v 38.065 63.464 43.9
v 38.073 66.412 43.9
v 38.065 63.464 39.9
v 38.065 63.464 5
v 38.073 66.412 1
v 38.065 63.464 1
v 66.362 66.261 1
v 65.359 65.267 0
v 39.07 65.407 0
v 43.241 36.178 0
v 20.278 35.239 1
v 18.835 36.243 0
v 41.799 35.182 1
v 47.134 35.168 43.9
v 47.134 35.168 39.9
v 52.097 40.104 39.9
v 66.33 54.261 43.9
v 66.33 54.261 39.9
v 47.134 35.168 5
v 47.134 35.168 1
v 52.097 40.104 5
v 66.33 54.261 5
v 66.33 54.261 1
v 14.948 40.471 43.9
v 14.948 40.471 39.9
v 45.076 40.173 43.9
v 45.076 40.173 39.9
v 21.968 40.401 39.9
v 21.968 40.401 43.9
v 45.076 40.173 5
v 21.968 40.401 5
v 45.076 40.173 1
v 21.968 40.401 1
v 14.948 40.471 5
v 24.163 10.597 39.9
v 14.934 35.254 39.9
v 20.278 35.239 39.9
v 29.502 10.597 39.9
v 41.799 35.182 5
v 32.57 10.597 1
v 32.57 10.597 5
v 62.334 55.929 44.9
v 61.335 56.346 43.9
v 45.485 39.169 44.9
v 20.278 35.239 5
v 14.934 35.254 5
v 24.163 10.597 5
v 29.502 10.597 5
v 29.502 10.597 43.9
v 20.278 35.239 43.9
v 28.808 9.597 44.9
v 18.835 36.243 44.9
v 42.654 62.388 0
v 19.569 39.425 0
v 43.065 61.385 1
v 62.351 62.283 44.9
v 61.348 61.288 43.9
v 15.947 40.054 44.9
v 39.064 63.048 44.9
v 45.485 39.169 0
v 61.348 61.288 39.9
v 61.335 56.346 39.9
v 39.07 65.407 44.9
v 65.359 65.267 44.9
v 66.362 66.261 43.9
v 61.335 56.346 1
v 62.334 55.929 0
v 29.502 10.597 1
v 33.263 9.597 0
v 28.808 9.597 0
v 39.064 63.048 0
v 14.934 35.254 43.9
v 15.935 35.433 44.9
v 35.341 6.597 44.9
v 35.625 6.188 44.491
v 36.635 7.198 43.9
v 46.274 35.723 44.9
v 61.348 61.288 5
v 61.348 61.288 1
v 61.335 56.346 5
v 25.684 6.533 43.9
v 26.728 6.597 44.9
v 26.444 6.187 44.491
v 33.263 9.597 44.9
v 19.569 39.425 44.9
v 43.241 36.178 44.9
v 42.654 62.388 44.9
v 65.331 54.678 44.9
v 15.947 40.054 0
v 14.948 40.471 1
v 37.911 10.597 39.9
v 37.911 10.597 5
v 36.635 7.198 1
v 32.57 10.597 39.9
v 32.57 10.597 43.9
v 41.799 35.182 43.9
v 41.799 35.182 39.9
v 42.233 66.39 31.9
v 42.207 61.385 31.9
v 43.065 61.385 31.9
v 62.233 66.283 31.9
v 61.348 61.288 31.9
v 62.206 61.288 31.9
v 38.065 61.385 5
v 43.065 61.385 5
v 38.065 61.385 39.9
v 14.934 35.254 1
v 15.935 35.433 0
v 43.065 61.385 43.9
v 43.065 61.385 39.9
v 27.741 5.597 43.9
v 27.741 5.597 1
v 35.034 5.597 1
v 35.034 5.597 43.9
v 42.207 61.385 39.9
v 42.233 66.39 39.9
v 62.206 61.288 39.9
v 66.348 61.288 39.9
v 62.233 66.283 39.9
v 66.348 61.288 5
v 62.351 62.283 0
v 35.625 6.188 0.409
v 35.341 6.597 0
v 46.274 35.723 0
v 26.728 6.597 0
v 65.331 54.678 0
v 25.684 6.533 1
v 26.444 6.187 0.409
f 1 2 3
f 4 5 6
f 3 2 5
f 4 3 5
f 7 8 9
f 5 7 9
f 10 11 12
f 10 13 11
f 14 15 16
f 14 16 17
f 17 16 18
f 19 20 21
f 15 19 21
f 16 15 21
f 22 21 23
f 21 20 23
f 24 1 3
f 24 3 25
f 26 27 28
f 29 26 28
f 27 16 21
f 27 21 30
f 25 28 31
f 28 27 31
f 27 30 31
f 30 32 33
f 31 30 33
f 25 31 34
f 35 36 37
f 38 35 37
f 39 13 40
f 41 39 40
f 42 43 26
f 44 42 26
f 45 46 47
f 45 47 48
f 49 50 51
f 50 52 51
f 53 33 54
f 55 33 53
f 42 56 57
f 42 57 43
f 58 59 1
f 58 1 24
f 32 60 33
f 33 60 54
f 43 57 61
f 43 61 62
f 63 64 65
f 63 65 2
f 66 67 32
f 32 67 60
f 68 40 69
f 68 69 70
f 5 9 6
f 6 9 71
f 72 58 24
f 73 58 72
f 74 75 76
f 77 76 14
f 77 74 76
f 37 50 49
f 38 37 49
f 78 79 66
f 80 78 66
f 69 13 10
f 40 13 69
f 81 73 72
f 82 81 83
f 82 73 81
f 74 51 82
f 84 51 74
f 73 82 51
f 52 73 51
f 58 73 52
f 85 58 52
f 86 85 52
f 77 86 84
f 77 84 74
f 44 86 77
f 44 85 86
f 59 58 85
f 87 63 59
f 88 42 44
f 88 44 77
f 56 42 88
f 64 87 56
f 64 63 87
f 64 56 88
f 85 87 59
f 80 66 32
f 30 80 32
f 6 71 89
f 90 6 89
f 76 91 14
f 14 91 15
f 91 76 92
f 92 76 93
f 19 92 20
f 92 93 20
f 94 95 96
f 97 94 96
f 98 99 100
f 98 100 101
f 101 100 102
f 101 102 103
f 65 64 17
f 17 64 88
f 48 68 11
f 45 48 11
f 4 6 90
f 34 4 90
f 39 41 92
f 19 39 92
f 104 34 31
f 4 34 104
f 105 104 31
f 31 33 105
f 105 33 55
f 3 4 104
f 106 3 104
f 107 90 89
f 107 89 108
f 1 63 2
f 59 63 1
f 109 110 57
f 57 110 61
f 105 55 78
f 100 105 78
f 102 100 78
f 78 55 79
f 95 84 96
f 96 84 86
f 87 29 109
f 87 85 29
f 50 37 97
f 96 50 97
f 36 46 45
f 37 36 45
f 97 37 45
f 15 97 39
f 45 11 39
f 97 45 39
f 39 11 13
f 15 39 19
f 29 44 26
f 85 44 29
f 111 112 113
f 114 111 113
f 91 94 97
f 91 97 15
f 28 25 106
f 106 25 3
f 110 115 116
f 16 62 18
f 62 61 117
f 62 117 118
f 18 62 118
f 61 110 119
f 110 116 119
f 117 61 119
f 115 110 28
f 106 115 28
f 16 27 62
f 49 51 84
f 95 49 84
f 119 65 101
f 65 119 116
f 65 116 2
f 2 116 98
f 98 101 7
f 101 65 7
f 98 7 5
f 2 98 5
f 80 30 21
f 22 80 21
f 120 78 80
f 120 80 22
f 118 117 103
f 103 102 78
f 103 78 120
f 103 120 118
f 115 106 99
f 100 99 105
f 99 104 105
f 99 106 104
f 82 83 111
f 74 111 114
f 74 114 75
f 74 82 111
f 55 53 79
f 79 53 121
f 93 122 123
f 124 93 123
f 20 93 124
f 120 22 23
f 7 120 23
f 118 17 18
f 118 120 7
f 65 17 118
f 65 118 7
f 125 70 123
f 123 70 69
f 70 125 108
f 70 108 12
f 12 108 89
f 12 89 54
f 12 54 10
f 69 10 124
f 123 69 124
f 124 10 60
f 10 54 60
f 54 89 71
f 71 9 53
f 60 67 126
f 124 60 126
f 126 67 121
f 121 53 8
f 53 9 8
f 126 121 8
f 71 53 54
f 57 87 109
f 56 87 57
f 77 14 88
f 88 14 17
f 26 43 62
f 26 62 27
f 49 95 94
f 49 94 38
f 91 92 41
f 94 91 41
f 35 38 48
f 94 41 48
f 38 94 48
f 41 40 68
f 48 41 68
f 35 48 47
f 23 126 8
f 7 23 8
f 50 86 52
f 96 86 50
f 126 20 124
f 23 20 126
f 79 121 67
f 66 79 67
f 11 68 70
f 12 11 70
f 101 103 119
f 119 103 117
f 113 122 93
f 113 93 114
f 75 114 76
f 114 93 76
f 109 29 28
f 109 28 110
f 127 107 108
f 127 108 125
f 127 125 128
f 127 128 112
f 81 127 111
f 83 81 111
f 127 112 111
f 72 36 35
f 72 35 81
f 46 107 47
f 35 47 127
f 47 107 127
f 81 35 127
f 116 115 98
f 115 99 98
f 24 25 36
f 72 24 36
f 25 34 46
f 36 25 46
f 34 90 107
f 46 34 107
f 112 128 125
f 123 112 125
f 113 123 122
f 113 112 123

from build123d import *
from OCP.BRepFilletAPI import BRepFilletAPI_MakeChamfer

# Parameters (mm, degrees)
BOSS_EXTRUDE1_DEPTH  = 5
BOSS_EXTRUDE3_DEPTH  = 5
BOSS_EXTRUDE4_DEPTH  = 26.9
SKETCH5_W            = 19.999999999999993
SKETCH5_H            = 5.000000000000007
CUT_EXTRUDE2_DEPTH   = 5.899999999999998
CUT_EXTRUDE3_DEPTH   = 2.949999999999999
BOSS_EXTRUDE5_DEPTH  = 3
BOSS_EXTRUDE6_DEPTH  = 5
BOSS_EXTRUDE7_DEPTH  = 5
BOSS_EXTRUDE8_DEPTH  = 35.00000000000001
BOSS_EXTRUDE10_DEPTH = 35.00000000000001
CHAMFER2_SIZE        = 1
CHAMFER3_SIZE        = 1
CHAMFER3_SIZE2       = 1.7100094702429673
CHAMFER3_SIZE2_2     = 1.7064334239442103


with BuildPart() as part:
    # Model → Boss-Extrude1 (new body)
    with BuildSketch(Plane.XY):
        Polygon((66.34301586992632, 59.26133691593834), (66.3616632211768, 66.2613120784865), (38.072757817888686, 66.41203172728402), (38.064905748927345, 63.464466308167324), (14.948145869822214, 40.47054145556226), (14.934248363068548, 35.253596657867014), (26.03420495541168, 5.596834863804027), (36.03420495541168, 5.596834863804027), (47.134161547754815, 35.167818769025025), (66.32969633331885, 54.261354656975335), align=None)
        Polygon((20.278317449078216, 35.23936050258937), (41.79885052391343, 35.18203159355395), (32.57039139015228, 10.596834863804013), (29.501541711242254, 10.596834863804041), align=None, mode=Mode.SUBTRACT)
        Polygon((43.06467722097951, 61.38536445785425), (61.3483968604827, 61.28795115170147), (61.3352312070632, 56.345734656870185), (45.076420621075016, 40.17331816069535), (21.96849830021793, 40.4012838462993), align=None, mode=Mode.SUBTRACT)
    extrude(amount=BOSS_EXTRUDE1_DEPTH)

    # Sketch3 → Boss-Extrude3 (add)
    with BuildSketch(Plane.XY.offset(5)):
        Polygon((66.36166322117678, 66.2613120784865), (38.072757817888686, 66.41203172728402), (38.064905748927345, 63.464466308167324), (38.064905748927345, 61.38536445785425), (43.06467722097951, 61.38536445785425), (61.3483968604827, 61.28795115170147), (66.34841460158263, 61.28795115170147), align=None)
    extrude(amount=BOSS_EXTRUDE3_DEPTH)

    # Sketch4 → Boss-Extrude4 (add)
    with BuildSketch(Plane.XY.offset(10)):
        Polygon((66.34841460158263, 61.28795115170147), (66.36166322117678, 66.2613120784865), (38.072757817888686, 66.41203172728402), (38.064905748927345, 63.464466308167324), (38.064905748927345, 61.38536445785425), (43.06467722097951, 61.38536445785425), (61.3483968604827, 61.28795115170147), align=None)
    extrude(amount=BOSS_EXTRUDE4_DEPTH)

    # Sketch5 → Cut-Extrude2 (cut)
    with BuildSketch(Plane(origin=(0.3282664498542539, 61.613058556670126, 0), x_dir=(0.999985807195565, -0.005327795738801082, 0), z_dir=(-0.005327795738801082, -0.999985807195565, 0))):
        with Locations((51.87900689947605, 34.400000000000006)):
            Rectangle(SKETCH5_W, SKETCH5_H)
    extrude(amount=-CUT_EXTRUDE2_DEPTH, mode=Mode.SUBTRACT)

    # Sketch7 → Cut-Extrude3 (cut, symmetric)
    with BuildSketch(Plane(origin=(0.32826644985427067, 61.61305855667014, 0), x_dir=(0.999985807195565, -0.005327795738801352, 0), z_dir=(0.005327795738801352, 0.999985807195565, 0))):
        Polygon((42.73701732925542, -31.9), (41.87900689947603, -31.9), (41.87900689947603, -36.900000000000006), (42.73701732945169, -36.900000000000006), align=None)
    extrude(amount=CUT_EXTRUDE3_DEPTH, both=True, mode=Mode.SUBTRACT)

    # Sketch8 → Boss-Extrude5 (add)
    with BuildSketch(Plane.XY.offset(36.900000000000006)):
        Polygon((38.064905748927345, 61.38536445785425), (42.20665461345415, 61.385364457854244), (42.23331794746946, 66.38986479814373), (38.072757817888686, 66.41203172728402), (38.064905748927345, 63.464466308167324), align=None)
        Polygon((66.36166322117678, 66.2613120784865), (62.23303409138075, 66.28330888336767), (62.20641946800804, 61.28795115170146), (66.34841460158263, 61.28795115170147), align=None)
    extrude(amount=BOSS_EXTRUDE5_DEPTH)

    # Sketch9 → Boss-Extrude6 (add)
    with BuildSketch(Plane.XY.offset(39.900000000000006)):
        Polygon((62.233034091380745, 66.28330888336767), (42.23331794746946, 66.38986479814372), (42.20665461345415, 61.38536445785425), (43.064677220980606, 61.38536445785425), (61.3483968604827, 61.28795115170147), (62.20641946800805, 61.28795115170147), align=None)
        Polygon((42.23331794746946, 66.38986479814373), (38.072757817888686, 66.41203172728402), (38.064905748927345, 63.464466308167324), (38.064905748927345, 61.38536445785425), (42.20665461345415, 61.385364457854244), align=None)
        Polygon((62.20641946800804, 61.28795115170146), (66.34841460158263, 61.28795115170147), (66.36166322117678, 66.2613120784865), (62.23303409138075, 66.28330888336767), align=None)
    extrude(amount=BOSS_EXTRUDE6_DEPTH)

    # Sketch10 → Boss-Extrude7 (add)
    with BuildSketch(Plane.XY.offset(44.900000000000006)):
        Polygon((66.34841460158262, 61.28795115170147), (61.3483968604827, 61.28795115170147), (61.3352312070632, 56.34573465687018), (45.076420621075016, 40.17331816069535), (21.968498300217927, 40.4012838462993), (43.06467722097951, 61.38536445785425), (38.064905748927345, 61.38536445785425), (38.064905748927345, 63.464466308167324), (14.948145869822214, 40.470541455562255), (14.934248363068548, 35.25359665786701), (26.03420495541168, 5.596834863804027), (36.03420495541168, 5.596834863804027), (47.134161547754815, 35.16781876902502), (66.32969633331884, 54.261354656975335), align=None)
        Polygon((29.50154171124225, 10.596834863804041), (32.57039139015229, 10.596834863804013), (41.79885052391343, 35.18203159355396), (20.278317449078216, 35.23936050258938), align=None, mode=Mode.SUBTRACT)
    extrude(amount=-BOSS_EXTRUDE7_DEPTH)

    # Sketch11 → Boss-Extrude8 (add)
    with BuildSketch(Plane.XY.offset(5)):
        Polygon((24.162800944848858, 10.596834863804041), (26.03420495541168, 5.596834863804027), (36.03420495541168, 5.596834863804027), (37.91103743212602, 10.596834863804041), align=None)
    extrude(amount=BOSS_EXTRUDE8_DEPTH)

    # Sketch12 → Boss-Extrude10 (add)
    with BuildSketch(Plane.XY.offset(5)):
        Polygon((52.096773051470755, 40.1040605514324), (14.948145869822214, 40.470541455562255), (14.934248363068548, 35.25359665786701), (47.134161547754815, 35.16781876902502), align=None)
    extrude(amount=BOSS_EXTRUDE10_DEPTH)

    # Chamfer2
    chamfer2_edges = [part.edges().sort_by_distance(p)[0] for p in [
        (52.217210519532735, 66.33667190288526, 44.900000000000006),
        (38.068831783408015, 64.93824901772567, 44.900000000000006),
        (52.206537040731654, 61.33665780477786, 44.900000000000006),
        (66.34567977724781, 60.26133336773091, 44.900000000000006),
        (20.484226659240115, 20.42521576083552, 0),
        (14.94119711644538, 37.86206905671464, 0),
        (26.50652580937478, 51.9675038818648, 0),
        (38.068831783408015, 64.93824901772567, 0),
        (61.34181403377295, 58.81684290428582, 44.900000000000006),
        (53.20582591406911, 48.25952640878276, 44.900000000000006),
        (33.52245946064647, 40.287301003497326, 44.900000000000006),
        (32.51658776059872, 50.89332415207677, 44.900000000000006),
        (52.21721051953274, 66.33667190288526, 0),
        (26.50652580937478, 51.967503881864786, 44.900000000000006),
        (14.94119711644538, 37.86206905671463, 44.900000000000006),
        (20.484226659240115, 20.425215760835517, 44.900000000000006),
        (31.03420495541168, 5.596834863804027, 44.900000000000006),
        (41.58418325158325, 20.382326816414523, 44.900000000000006),
        (56.731928940536825, 44.71458671300017, 44.900000000000006),
        (24.889929580160235, 22.91809768319671, 44.900000000000006),
        (31.038583986495823, 35.21069604807167, 44.900000000000006),
        (37.18462095703286, 22.889433228678985, 44.900000000000006),
        (31.035966550697268, 10.596834863804027, 44.900000000000006),
        (66.34567977724782, 60.26133336773091, 0),
        (56.73192894053683, 44.71458671300018, 0),
        (41.58418325158325, 20.382326816414526, 0),
        (31.03420495541168, 5.596834863804027, 0),
        (53.20582591406911, 48.25952640878277, 0),
        (61.34181403377295, 58.81684290428583, 0),
        (52.20653704073111, 61.33665780477786, 0),
        (32.516587760598725, 50.89332415207678, 0),
        (33.52245946064647, 40.287301003497326, 0),
        (37.184620957032855, 22.889433228678982, 0),
        (31.038583986495823, 35.21069604807166, 0),
        (24.889929580160235, 22.918097683196706, 0),
        (31.035966550697268, 10.596834863804027, 0),
    ]]
    chamfer(chamfer2_edges, length=CHAMFER2_SIZE)

    # Chamfer3: one chamfer whose edges measure the first distance from different faces: ONE call of the kernel's chamfer builder (chamfer() names one face for all edges)
    chamfer3_edges_1 = [part.edges().sort_by_distance(p)[0] for p in [
        (36.03420495541168, 5.596834863804027, 22.450000000000003),
    ]]
    chamfer3_side_1 = [part.faces().sort_by_distance(p)[0] for p in [
        (31.03420495541168, 5.596834863804027, 22.450000000000003),
    ]]
    chamfer3_edges_2 = [part.edges().sort_by_distance(p)[0] for p in [
        (26.03420495541168, 5.596834863804027, 22.450000000000003),
    ]]
    chamfer3_side_2 = [part.faces().sort_by_distance(p)[0] for p in [
        (15.121156427701985, 34.75421741218178, 3),
    ]]
    chamfer3 = BRepFilletAPI_MakeChamfer(part.part.solid().wrapped)
    for e in chamfer3_edges_1:
        chamfer3.Add(CHAMFER3_SIZE, CHAMFER3_SIZE2, e.wrapped, chamfer3_side_1[0].wrapped)  # the first distance lies on this face
    for e in chamfer3_edges_2:
        chamfer3.Add(CHAMFER3_SIZE, CHAMFER3_SIZE2_2, e.wrapped, chamfer3_side_2[0].wrapped)  # the first distance lies on this face
    add(Compound.cast(chamfer3.Shape()), mode=Mode.REPLACE)


solid = part.part
